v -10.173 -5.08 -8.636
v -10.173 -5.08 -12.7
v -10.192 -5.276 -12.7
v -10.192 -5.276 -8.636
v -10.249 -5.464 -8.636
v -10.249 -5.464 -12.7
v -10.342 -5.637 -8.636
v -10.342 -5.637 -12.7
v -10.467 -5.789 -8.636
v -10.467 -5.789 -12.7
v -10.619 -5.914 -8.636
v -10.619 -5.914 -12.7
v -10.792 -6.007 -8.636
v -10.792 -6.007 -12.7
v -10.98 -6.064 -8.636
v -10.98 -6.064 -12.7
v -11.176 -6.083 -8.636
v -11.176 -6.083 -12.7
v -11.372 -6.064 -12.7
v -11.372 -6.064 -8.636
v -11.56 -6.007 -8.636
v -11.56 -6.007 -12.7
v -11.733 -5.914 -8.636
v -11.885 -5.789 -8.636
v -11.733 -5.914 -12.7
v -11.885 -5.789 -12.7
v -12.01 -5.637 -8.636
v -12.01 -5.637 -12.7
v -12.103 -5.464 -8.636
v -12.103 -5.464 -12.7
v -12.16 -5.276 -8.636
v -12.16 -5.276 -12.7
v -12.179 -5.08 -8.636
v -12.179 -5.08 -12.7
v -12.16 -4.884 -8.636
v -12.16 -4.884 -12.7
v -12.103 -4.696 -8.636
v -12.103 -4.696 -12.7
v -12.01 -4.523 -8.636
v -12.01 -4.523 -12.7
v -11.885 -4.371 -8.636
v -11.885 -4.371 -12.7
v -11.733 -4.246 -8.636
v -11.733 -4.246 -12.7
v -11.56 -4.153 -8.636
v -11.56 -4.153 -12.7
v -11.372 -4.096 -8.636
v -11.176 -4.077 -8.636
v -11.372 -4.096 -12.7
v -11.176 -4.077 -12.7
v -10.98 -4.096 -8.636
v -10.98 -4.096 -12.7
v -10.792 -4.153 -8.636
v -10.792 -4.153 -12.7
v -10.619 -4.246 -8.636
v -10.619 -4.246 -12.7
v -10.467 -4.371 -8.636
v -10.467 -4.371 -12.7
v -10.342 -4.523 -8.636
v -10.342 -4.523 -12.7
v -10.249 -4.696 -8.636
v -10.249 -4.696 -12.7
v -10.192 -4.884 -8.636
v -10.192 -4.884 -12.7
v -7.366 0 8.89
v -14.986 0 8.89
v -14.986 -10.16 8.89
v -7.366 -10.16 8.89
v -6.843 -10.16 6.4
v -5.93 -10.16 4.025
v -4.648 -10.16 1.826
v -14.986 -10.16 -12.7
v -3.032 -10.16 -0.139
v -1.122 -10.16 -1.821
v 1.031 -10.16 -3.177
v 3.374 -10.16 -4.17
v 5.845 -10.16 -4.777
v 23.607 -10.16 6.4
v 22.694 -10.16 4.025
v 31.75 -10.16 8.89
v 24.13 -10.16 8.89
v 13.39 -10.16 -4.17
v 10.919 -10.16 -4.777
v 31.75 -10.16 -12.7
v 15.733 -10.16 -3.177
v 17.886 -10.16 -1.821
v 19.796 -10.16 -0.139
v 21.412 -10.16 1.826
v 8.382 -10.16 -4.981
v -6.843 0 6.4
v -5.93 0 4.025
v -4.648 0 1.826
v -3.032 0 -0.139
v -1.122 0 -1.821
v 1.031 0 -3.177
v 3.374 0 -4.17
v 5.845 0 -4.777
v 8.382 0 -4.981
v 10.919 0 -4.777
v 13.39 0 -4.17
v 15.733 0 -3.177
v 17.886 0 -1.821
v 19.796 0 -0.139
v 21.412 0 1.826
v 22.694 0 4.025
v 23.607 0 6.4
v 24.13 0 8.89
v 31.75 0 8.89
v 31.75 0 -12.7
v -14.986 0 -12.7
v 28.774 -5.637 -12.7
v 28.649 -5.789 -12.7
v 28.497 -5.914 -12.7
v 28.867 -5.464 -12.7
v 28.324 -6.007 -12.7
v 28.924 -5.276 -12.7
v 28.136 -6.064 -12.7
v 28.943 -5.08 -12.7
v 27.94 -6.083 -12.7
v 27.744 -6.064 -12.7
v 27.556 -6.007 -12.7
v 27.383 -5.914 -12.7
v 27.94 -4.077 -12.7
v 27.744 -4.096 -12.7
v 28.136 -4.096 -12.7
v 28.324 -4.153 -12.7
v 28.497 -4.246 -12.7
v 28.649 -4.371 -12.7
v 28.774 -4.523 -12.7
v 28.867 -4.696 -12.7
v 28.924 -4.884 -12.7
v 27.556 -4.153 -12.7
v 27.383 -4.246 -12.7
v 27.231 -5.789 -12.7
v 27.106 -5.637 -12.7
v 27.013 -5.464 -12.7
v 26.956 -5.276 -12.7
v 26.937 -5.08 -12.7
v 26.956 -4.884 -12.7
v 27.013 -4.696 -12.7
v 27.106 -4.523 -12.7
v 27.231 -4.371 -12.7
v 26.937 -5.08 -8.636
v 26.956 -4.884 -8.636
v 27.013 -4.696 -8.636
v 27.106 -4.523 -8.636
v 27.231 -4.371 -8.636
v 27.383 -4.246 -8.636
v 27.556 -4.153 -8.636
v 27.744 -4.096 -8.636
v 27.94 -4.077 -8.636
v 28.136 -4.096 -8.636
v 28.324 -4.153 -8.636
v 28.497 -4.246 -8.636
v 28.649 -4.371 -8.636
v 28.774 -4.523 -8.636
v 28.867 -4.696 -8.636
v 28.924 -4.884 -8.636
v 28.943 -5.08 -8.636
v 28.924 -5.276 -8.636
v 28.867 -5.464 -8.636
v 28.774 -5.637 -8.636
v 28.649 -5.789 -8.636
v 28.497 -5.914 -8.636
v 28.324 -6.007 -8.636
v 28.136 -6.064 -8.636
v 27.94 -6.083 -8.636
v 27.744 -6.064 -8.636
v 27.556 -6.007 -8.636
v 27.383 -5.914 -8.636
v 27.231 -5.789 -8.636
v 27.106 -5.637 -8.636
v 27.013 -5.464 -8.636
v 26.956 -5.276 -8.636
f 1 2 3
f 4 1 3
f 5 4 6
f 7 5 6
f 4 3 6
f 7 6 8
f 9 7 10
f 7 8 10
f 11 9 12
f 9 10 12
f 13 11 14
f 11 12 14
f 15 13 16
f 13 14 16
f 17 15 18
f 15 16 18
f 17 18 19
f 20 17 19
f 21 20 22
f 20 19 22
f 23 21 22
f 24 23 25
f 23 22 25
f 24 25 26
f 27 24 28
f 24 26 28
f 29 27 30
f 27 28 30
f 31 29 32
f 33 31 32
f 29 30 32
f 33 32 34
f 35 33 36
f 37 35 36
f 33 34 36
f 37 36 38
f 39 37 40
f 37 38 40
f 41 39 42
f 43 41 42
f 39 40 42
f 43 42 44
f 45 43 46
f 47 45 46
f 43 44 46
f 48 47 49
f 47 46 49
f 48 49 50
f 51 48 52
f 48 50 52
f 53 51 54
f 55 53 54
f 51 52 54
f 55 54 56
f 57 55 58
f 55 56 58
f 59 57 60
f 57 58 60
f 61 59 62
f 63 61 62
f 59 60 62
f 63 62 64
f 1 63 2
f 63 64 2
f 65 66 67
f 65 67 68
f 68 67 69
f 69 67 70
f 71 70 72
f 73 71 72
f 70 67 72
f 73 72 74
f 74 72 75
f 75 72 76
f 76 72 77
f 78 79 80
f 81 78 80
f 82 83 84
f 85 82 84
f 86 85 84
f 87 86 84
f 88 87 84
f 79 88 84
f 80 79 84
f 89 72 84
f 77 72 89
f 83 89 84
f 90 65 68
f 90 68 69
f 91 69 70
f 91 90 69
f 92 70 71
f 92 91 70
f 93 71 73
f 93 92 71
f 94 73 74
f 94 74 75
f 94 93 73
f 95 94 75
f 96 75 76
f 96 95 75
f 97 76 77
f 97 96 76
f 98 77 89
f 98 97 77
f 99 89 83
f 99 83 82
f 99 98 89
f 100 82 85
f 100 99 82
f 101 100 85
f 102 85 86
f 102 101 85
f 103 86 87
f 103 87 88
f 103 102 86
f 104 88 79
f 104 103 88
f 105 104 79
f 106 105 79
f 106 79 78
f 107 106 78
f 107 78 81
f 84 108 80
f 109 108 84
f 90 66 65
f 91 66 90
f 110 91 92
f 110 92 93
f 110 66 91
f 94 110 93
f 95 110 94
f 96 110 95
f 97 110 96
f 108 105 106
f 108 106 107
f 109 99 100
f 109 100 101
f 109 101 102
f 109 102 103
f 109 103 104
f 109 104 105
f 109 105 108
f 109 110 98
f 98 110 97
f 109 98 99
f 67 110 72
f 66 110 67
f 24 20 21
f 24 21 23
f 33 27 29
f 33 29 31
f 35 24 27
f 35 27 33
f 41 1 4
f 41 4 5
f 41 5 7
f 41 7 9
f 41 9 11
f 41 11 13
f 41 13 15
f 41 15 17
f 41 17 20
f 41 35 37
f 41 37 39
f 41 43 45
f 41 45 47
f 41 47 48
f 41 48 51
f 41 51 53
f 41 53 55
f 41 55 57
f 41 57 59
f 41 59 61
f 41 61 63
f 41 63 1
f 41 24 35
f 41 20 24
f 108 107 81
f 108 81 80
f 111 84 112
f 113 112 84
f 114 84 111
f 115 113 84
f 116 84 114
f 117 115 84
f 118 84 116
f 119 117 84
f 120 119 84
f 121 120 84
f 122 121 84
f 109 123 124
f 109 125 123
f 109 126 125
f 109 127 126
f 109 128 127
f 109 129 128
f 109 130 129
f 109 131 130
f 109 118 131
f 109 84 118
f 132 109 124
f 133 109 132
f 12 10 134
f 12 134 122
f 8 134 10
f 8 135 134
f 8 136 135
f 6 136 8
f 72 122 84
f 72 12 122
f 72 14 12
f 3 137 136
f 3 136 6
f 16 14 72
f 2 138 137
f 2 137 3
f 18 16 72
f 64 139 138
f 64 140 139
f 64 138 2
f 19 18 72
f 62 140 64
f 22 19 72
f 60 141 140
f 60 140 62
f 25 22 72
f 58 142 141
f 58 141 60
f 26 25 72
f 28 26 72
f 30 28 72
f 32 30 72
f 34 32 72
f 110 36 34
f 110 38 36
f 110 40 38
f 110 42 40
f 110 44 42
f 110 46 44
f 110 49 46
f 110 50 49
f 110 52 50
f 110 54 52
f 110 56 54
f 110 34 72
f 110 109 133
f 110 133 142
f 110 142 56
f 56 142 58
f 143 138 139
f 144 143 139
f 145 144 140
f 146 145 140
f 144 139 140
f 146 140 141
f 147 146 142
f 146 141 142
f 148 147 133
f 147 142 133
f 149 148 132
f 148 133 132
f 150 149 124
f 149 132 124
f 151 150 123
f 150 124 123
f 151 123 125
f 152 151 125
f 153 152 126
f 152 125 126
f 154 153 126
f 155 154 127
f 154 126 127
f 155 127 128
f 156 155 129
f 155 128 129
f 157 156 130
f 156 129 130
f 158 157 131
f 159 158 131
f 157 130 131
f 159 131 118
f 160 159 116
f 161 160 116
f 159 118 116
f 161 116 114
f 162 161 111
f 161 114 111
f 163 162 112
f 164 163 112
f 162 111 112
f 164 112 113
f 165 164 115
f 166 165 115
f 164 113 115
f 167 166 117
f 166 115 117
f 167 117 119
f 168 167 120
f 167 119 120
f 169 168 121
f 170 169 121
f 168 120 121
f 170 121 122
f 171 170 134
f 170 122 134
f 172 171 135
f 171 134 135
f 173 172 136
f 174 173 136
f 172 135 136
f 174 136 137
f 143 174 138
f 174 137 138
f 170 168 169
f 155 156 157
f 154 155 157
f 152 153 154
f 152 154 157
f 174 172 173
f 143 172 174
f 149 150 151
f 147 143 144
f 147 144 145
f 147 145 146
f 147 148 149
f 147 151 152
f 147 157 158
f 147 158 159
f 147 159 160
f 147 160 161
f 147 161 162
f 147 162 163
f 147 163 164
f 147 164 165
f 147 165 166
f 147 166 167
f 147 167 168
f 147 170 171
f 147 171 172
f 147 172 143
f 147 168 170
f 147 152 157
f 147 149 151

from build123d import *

# Parameters (mm, degrees)
BOSS_EXTRUDE1_DEPTH = 10.16
CUT_EXTRUDE1_DEPTH  = 4.064


with BuildPart() as part:
    # Sketch2 → Boss-Extrude1 (new body)
    with BuildSketch(Plane(origin=(0, 0, 0), x_dir=(1, 0, 0), z_dir=(0, 1, 0))):
        with BuildLine():
            Line((-14.986, -8.89), (-7.366, -8.89))
            ThreePointArc((-7.366, -8.89), (8.382, 4.980973803), (24.13, -8.89))
            Line((24.13, -8.89), (31.75, -8.89))
            Line((31.75, -8.89), (31.75, 12.7))
            Line((31.75, 12.7), (-14.986, 12.7))
            Line((-14.986, 12.7), (-14.986, -8.89))
        make_face()
    extrude(amount=-BOSS_EXTRUDE1_DEPTH)

    # Sketch6 → Cut-Extrude1 (cut)
    with BuildSketch(Plane(origin=(0, 0, -12.7), x_dir=(-1, 0, 0), z_dir=(0, 0, -1))):
        with BuildLine():
            ThreePointArc((-28.9433, -5.08), (-27.94, -6.0833), (-26.9367, -5.08))
            Line((-26.9367, -5.08), (-27.94, -5.08))
            Line((-27.94, -5.08), (-28.9433, -5.08))
        make_face()
        with BuildLine():
            Line((-27.94, -5.08), (-26.9367, -5.08))
            ThreePointArc((-26.9367, -5.08), (-27.94, -4.0767), (-28.9433, -5.08))
            Line((-28.9433, -5.08), (-27.94, -5.08))
        make_face()
        with BuildLine():
            Line((10.1727, -5.08), (11.176, -5.08))
            Line((11.176, -5.08), (12.1793, -5.08))
            ThreePointArc((12.1793, -5.08), (11.176, -4.0767), (10.1727, -5.08))
        make_face()
        with BuildLine():
            Line((12.1793, -5.08), (11.176, -5.08))
            Line((11.176, -5.08), (10.1727, -5.08))
            ThreePointArc((10.1727, -5.08), (11.176, -6.0833), (12.1793, -5.08))
        make_face()
    extrude(amount=-CUT_EXTRUDE1_DEPTH, mode=Mode.SUBTRACT)


solid = part.part
